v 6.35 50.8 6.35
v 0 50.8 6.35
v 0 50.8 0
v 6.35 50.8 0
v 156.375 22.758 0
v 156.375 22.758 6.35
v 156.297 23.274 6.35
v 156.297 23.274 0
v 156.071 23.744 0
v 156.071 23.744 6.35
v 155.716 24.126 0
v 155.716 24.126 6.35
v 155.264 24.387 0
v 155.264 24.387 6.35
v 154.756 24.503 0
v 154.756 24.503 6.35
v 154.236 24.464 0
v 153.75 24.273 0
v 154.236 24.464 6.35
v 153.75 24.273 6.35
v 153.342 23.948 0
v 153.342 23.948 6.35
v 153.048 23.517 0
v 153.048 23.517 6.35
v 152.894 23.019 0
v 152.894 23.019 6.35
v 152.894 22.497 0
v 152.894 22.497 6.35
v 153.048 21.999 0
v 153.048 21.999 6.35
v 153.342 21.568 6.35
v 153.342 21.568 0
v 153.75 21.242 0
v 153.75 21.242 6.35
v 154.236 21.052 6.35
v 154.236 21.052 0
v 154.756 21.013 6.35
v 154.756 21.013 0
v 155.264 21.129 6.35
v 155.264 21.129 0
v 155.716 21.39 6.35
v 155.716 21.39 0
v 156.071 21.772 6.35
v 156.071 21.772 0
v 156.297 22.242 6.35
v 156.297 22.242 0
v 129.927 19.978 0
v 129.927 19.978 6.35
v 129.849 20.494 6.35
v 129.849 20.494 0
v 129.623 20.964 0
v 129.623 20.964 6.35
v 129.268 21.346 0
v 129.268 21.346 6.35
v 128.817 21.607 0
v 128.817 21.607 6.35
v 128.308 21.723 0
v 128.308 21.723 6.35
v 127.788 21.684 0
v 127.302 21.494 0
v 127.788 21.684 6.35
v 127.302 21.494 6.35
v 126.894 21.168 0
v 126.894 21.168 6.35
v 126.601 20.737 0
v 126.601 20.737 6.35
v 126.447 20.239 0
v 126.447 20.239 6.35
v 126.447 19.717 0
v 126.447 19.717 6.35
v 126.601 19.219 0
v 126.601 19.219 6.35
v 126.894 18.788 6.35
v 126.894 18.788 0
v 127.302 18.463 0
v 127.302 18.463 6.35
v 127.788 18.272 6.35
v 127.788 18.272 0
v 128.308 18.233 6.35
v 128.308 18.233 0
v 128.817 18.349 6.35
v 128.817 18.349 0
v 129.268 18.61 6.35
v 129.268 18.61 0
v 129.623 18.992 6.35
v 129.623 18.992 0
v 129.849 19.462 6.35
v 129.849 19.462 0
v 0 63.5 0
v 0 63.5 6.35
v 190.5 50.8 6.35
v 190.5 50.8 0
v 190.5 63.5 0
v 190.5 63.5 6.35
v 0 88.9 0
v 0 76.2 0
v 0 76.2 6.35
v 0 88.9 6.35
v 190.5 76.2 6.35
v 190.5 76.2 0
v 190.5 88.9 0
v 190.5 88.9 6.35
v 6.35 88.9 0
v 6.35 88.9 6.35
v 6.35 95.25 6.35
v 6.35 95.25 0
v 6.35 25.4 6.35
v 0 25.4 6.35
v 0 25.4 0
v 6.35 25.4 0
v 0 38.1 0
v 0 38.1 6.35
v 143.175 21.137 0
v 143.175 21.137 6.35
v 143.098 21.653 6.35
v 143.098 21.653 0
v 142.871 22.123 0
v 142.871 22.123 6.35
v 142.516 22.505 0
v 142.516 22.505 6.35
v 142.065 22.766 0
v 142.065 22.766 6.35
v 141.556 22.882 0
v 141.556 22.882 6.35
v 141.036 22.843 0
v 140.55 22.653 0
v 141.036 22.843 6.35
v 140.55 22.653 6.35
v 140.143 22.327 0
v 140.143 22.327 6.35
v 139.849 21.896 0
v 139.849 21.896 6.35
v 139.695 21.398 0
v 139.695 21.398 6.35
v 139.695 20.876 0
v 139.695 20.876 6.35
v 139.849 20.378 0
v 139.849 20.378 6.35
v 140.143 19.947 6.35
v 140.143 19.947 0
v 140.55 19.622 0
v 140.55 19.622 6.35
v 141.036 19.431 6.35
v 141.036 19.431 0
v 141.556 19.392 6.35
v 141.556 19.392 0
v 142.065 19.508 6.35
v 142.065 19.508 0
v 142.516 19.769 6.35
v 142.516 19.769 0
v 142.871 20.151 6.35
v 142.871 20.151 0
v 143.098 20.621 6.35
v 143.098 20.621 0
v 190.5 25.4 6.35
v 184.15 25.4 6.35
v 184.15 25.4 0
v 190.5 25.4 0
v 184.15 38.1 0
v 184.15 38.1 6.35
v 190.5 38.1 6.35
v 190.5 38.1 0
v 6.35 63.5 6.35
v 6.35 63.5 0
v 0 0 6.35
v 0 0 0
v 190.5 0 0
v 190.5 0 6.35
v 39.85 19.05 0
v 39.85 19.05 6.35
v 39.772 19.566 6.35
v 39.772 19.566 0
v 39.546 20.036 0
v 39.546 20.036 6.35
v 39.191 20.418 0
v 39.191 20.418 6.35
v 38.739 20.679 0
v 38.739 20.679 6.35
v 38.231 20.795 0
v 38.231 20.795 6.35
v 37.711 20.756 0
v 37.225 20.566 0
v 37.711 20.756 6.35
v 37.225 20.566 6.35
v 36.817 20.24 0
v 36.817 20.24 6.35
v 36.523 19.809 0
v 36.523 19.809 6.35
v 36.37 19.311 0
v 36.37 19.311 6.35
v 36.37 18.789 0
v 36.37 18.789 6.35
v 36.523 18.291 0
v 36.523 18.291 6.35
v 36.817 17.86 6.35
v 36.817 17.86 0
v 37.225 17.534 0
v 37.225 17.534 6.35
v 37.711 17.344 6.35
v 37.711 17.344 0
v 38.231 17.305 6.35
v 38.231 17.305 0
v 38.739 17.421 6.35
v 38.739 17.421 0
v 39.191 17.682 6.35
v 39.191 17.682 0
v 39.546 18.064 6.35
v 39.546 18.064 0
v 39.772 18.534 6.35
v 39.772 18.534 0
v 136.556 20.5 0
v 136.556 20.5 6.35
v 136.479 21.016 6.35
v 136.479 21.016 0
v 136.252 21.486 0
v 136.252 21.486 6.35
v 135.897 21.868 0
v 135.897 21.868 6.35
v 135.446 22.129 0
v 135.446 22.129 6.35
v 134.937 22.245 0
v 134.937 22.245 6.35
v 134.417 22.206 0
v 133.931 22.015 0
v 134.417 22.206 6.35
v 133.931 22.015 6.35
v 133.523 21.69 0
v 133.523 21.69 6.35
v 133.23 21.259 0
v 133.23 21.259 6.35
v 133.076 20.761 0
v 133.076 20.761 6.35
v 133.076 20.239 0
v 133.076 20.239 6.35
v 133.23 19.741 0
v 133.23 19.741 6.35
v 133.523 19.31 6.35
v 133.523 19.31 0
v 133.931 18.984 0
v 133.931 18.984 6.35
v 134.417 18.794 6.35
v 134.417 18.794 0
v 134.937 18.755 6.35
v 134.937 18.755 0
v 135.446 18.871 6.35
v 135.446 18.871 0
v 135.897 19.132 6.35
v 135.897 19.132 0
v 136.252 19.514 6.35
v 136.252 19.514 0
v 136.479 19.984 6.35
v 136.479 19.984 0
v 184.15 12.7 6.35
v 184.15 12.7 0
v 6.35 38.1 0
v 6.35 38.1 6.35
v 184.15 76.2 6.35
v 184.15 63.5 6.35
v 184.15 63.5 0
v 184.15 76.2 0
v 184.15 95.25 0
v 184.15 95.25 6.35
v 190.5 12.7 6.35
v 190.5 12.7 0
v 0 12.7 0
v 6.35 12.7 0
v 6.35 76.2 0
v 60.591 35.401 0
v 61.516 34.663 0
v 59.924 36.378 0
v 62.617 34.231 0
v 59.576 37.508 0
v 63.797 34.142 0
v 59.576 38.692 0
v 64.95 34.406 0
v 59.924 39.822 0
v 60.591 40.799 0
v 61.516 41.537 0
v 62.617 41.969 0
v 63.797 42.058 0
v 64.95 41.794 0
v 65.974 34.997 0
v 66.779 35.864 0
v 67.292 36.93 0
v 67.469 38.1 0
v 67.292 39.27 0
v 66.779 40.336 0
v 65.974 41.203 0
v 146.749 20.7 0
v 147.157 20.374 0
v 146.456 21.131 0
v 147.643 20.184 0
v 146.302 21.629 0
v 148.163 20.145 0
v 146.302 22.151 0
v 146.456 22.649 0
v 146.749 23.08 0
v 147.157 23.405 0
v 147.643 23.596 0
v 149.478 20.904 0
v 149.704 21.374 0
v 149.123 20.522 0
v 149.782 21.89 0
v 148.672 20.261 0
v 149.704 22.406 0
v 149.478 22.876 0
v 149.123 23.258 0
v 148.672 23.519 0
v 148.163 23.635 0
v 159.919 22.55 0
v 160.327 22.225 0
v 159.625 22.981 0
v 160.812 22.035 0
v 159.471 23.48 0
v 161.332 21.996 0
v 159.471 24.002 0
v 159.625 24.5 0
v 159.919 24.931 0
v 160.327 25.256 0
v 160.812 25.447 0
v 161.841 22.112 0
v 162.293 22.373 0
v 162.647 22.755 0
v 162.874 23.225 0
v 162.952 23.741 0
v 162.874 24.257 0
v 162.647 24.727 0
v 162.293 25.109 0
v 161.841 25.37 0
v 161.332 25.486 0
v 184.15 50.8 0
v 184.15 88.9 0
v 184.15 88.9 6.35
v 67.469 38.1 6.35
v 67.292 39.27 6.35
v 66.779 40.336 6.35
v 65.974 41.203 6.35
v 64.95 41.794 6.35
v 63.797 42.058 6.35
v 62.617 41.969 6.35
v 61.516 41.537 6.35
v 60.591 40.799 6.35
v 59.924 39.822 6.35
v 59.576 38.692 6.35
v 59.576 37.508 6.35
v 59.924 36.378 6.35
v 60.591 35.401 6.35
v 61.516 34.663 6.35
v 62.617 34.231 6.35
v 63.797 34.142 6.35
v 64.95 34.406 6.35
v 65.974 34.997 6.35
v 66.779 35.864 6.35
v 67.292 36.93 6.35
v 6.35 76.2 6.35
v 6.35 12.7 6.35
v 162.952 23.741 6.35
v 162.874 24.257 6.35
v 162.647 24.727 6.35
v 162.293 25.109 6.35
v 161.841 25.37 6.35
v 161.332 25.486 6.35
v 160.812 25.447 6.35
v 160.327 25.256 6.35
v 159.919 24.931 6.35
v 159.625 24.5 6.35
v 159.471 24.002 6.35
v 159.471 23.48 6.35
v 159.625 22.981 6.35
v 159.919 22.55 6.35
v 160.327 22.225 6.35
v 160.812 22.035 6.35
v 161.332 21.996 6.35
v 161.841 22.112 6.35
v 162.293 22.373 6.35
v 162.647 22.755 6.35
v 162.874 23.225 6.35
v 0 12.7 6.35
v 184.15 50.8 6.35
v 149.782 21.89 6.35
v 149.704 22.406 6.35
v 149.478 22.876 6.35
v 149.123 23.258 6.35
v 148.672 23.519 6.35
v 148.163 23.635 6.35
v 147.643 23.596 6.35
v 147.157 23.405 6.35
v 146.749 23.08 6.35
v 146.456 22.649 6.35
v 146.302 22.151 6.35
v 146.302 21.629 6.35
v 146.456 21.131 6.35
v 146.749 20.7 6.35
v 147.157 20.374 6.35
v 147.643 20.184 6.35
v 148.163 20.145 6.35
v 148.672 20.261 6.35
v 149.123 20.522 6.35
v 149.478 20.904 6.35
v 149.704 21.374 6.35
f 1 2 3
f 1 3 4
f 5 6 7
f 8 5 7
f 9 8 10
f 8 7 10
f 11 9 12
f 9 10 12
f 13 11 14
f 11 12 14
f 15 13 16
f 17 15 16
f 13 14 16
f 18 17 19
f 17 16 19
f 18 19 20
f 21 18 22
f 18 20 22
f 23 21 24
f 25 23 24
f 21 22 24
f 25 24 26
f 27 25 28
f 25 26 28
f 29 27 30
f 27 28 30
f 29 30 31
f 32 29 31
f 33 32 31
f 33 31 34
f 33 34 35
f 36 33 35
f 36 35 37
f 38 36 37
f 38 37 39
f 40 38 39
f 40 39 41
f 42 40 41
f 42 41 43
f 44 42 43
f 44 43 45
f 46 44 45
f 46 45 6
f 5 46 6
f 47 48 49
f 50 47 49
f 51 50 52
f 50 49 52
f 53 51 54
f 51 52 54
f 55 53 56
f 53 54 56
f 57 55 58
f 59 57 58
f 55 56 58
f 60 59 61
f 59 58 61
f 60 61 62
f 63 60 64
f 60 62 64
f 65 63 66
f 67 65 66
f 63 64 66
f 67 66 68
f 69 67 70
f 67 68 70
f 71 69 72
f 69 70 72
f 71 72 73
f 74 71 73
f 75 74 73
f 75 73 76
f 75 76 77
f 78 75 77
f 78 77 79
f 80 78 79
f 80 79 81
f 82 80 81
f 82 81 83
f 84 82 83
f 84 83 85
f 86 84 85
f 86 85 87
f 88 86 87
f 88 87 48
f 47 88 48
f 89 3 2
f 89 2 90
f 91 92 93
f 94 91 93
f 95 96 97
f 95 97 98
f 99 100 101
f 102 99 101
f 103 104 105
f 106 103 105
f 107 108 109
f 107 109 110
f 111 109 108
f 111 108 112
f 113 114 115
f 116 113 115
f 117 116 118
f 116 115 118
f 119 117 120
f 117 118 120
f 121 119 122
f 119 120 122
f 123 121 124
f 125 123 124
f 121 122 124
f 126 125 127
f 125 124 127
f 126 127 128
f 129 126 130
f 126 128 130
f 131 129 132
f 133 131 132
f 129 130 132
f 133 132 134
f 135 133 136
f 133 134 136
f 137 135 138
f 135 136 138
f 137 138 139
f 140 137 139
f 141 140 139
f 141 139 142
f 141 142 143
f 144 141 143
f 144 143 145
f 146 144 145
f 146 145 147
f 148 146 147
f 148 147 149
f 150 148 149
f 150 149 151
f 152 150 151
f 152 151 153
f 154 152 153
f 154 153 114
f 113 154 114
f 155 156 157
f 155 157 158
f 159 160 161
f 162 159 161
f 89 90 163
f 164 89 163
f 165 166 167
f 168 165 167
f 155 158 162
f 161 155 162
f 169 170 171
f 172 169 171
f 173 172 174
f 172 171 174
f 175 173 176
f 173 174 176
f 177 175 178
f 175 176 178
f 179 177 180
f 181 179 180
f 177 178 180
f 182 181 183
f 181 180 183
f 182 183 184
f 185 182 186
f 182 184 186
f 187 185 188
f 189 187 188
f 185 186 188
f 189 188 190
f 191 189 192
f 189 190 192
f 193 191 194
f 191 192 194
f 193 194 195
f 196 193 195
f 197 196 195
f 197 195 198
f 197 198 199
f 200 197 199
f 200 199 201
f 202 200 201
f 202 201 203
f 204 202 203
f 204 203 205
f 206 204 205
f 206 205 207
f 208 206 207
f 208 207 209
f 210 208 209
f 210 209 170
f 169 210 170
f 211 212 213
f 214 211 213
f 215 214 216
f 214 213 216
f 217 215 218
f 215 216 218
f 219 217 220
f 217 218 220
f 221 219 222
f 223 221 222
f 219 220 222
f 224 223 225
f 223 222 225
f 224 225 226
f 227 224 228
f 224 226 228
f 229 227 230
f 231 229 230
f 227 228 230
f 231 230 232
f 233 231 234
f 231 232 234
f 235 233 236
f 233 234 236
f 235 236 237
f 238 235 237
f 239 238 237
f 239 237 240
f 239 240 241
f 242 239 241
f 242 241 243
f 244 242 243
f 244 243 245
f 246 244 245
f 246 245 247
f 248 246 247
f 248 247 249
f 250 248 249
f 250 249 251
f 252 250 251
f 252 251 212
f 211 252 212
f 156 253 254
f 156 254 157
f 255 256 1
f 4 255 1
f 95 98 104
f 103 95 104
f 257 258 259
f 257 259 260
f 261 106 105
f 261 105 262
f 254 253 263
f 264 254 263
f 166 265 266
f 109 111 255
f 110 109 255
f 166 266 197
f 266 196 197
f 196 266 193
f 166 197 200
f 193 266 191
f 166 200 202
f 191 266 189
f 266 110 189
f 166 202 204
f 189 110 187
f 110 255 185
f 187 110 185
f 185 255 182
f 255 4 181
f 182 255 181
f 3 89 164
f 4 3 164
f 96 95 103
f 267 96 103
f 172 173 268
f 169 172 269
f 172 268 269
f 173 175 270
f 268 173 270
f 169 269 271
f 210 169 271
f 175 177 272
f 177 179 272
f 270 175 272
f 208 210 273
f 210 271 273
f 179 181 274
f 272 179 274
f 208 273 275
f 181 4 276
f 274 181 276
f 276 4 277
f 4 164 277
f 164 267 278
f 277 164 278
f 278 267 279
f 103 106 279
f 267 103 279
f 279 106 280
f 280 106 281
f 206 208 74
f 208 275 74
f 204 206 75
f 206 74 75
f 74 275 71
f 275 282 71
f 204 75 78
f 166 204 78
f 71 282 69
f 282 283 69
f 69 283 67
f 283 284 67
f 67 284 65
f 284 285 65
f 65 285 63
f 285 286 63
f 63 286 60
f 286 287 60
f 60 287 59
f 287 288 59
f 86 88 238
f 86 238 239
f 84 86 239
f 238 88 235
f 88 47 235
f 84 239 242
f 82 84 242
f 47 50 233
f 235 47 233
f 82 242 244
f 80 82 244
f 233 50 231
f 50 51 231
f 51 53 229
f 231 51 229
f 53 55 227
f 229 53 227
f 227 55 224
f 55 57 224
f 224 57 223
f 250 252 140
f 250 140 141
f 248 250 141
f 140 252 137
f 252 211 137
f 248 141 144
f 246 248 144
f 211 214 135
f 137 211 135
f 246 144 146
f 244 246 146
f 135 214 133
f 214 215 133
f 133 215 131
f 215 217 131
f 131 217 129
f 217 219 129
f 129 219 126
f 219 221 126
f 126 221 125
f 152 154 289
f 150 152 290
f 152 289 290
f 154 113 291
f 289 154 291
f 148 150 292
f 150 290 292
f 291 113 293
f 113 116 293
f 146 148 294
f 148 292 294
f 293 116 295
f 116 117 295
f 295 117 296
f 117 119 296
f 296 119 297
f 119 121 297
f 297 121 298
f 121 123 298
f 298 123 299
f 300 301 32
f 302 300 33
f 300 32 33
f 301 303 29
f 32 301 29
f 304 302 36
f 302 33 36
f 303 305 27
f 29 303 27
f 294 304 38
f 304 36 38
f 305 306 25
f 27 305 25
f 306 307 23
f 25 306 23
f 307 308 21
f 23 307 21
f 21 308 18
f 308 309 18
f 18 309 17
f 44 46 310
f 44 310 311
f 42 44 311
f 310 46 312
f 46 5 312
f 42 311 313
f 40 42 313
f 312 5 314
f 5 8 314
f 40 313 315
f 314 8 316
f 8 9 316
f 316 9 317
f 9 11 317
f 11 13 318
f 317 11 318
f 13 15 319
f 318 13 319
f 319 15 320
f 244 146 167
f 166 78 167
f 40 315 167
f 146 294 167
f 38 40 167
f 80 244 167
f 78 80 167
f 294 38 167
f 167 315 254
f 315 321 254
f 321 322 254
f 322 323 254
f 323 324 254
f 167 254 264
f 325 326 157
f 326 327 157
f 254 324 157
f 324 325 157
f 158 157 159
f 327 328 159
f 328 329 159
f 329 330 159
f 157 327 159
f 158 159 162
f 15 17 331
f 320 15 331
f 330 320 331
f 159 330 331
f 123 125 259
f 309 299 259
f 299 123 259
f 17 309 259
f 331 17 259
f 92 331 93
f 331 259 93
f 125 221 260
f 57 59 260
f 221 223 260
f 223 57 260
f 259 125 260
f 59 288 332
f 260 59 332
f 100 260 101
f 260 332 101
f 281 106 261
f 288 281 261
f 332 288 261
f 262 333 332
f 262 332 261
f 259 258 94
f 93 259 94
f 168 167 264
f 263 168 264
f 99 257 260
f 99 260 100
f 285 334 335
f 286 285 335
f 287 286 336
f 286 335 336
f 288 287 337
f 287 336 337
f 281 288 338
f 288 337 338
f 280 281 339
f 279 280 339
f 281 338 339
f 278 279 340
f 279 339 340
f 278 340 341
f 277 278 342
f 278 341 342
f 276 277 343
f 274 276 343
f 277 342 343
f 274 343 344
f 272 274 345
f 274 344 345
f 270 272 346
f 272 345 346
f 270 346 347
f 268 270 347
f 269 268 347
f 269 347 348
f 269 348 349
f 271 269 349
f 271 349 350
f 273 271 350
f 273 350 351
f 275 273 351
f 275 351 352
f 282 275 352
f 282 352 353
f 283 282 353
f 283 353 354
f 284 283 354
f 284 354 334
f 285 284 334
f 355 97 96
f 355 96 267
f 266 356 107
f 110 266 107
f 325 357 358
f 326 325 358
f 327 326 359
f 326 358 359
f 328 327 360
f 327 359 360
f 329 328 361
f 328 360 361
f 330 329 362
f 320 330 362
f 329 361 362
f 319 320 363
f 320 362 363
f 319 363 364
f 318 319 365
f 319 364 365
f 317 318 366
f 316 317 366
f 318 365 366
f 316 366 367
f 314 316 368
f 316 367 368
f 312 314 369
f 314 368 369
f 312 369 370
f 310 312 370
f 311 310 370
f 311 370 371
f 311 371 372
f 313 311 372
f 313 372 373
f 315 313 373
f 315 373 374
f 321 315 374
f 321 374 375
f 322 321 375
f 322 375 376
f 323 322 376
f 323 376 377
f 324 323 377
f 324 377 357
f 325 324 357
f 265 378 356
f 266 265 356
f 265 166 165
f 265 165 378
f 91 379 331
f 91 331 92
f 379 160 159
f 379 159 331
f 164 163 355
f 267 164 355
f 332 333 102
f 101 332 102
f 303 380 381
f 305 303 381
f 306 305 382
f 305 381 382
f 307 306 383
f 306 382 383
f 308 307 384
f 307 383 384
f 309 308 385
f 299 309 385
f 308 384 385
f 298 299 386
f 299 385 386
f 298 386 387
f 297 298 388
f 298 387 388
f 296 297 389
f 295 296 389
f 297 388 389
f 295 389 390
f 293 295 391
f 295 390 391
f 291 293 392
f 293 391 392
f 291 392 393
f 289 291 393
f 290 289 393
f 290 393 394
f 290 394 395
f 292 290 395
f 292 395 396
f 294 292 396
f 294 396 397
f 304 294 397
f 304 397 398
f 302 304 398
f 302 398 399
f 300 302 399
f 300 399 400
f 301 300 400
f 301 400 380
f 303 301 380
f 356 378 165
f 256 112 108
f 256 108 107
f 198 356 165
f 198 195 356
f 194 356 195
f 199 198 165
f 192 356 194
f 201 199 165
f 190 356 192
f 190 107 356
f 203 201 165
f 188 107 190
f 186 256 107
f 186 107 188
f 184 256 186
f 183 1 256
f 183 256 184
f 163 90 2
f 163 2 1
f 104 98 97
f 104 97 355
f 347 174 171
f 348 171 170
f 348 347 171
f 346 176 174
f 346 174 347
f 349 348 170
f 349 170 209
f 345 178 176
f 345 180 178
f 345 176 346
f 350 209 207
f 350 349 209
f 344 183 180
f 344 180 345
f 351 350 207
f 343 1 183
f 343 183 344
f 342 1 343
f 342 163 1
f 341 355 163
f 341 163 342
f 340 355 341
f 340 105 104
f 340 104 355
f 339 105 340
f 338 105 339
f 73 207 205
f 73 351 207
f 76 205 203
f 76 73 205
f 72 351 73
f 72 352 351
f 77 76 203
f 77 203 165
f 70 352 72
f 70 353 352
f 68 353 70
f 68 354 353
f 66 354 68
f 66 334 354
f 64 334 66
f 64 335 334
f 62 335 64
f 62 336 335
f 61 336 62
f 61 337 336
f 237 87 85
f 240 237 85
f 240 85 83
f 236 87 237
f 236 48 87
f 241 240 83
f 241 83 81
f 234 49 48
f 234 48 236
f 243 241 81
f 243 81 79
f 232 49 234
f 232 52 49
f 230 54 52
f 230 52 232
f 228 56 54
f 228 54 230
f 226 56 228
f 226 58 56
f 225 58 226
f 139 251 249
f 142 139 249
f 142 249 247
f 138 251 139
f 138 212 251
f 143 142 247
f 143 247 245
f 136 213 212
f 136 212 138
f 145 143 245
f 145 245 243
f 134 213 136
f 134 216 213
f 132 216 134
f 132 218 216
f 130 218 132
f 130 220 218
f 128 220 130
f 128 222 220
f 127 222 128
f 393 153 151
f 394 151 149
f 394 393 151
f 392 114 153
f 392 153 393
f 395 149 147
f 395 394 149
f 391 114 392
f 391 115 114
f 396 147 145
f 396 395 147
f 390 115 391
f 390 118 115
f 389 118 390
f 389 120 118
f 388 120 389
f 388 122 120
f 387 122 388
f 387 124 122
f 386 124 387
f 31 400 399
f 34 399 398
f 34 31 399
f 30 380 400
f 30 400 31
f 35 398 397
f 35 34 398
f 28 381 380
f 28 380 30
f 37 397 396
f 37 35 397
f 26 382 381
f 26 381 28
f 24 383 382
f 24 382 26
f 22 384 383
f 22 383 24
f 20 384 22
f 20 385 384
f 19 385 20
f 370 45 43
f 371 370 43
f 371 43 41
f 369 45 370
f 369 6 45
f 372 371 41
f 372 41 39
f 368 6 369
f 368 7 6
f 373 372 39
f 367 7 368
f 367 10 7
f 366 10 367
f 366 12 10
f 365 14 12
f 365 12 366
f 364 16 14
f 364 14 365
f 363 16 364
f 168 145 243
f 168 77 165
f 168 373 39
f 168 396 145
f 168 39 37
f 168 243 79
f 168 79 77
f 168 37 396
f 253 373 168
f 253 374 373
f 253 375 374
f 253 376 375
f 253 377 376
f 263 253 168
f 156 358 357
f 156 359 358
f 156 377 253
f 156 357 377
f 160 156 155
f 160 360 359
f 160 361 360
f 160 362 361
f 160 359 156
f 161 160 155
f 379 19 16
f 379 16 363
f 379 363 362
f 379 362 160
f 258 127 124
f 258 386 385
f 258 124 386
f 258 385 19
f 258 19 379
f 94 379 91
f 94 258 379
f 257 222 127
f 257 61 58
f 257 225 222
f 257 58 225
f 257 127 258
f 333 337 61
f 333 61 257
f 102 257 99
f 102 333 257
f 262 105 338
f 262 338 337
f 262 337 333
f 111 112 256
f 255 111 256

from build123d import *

# Parameters (mm, degrees)
SKETCH1_W           = 190.5
SKETCH1_H           = 95.25
BOSS_EXTRUDE1_DEPTH = 6.35
SKETCH2_R           = 3.96875
CUT_EXTRUDE1_DEPTH  = 7.35
SKETCH3_W           = 6.35
SKETCH3_H           = 12.7
CUT_EXTRUDE2_DEPTH  = 7.35
SKETCH4_W           = 6.35
SKETCH4_H           = 12.7
CUT_EXTRUDE3_DEPTH  = 7.35
LPATTERN1_COUNT     = 4
LPATTERN1_PITCH     = 25.4
SKETCH5_R           = 1.75
CUT_EXTRUDE4_DEPTH  = 7.35


with BuildPart() as part:
    # Sketch1 → Boss-Extrude1 (new body)
    with BuildSketch(Plane.XY):
        with Locations((95.25, 47.625)):
            Rectangle(SKETCH1_W, SKETCH1_H)
    extrude(amount=BOSS_EXTRUDE1_DEPTH)

    # Sketch2 → Cut-Extrude1 (cut, through all)
    with BuildSketch(Plane.XY.offset(6.35)):
        with Locations((63.5, 38.1)):
            Circle(SKETCH2_R)
    extrude(amount=-CUT_EXTRUDE1_DEPTH, mode=Mode.SUBTRACT)

    # Sketch3 → Cut-Extrude2 (cut, through all)
    with BuildSketch(Plane.XY.offset(6.35)):
        with Locations((3.175, 19.05)):
            Rectangle(SKETCH3_W, SKETCH3_H)
    cut_extrude2 = extrude(amount=-CUT_EXTRUDE2_DEPTH, mode=Mode.SUBTRACT)

    # Sketch4 → Cut-Extrude3 (cut, through all)
    with BuildSketch(Plane.XY.offset(6.35)):
        with Locations((187.325, 19.05)):
            Rectangle(SKETCH4_W, SKETCH4_H)
    cut_extrude3 = extrude(amount=-CUT_EXTRUDE3_DEPTH, mode=Mode.SUBTRACT)

    # LPattern1: Cut-Extrude2, Cut-Extrude3 ×4
    with Locations(*[(0, i * LPATTERN1_PITCH, 0) for i in range(1, LPATTERN1_COUNT)]):
        add(cut_extrude2, mode=Mode.SUBTRACT)
        add(cut_extrude3, mode=Mode.SUBTRACT)

    # Sketch5 → Cut-Extrude4 (cut, through all)
    with BuildSketch(Plane.XY.offset(6.35)):
        with Locations((38.1, 19.05)):
            Circle(SKETCH5_R)
        with Locations((128.177216497, 19.978096851)):
            Circle(SKETCH5_R)
        with Locations((134.806337987, 20.499820027)):
            Circle(SKETCH5_R)
        with Locations((141.425344505, 21.137157865)):
            Circle(SKETCH5_R)
        with Locations((148.032219837, 21.889916225)):
            Circle(SKETCH5_R)
        with Locations((154.624951466, 22.757865809)):
            Circle(SKETCH5_R)
        with Locations((161.20153118, 23.740742233)):
            Circle(SKETCH5_R)
    extrude(amount=-CUT_EXTRUDE4_DEPTH, mode=Mode.SUBTRACT)


solid = part.part
